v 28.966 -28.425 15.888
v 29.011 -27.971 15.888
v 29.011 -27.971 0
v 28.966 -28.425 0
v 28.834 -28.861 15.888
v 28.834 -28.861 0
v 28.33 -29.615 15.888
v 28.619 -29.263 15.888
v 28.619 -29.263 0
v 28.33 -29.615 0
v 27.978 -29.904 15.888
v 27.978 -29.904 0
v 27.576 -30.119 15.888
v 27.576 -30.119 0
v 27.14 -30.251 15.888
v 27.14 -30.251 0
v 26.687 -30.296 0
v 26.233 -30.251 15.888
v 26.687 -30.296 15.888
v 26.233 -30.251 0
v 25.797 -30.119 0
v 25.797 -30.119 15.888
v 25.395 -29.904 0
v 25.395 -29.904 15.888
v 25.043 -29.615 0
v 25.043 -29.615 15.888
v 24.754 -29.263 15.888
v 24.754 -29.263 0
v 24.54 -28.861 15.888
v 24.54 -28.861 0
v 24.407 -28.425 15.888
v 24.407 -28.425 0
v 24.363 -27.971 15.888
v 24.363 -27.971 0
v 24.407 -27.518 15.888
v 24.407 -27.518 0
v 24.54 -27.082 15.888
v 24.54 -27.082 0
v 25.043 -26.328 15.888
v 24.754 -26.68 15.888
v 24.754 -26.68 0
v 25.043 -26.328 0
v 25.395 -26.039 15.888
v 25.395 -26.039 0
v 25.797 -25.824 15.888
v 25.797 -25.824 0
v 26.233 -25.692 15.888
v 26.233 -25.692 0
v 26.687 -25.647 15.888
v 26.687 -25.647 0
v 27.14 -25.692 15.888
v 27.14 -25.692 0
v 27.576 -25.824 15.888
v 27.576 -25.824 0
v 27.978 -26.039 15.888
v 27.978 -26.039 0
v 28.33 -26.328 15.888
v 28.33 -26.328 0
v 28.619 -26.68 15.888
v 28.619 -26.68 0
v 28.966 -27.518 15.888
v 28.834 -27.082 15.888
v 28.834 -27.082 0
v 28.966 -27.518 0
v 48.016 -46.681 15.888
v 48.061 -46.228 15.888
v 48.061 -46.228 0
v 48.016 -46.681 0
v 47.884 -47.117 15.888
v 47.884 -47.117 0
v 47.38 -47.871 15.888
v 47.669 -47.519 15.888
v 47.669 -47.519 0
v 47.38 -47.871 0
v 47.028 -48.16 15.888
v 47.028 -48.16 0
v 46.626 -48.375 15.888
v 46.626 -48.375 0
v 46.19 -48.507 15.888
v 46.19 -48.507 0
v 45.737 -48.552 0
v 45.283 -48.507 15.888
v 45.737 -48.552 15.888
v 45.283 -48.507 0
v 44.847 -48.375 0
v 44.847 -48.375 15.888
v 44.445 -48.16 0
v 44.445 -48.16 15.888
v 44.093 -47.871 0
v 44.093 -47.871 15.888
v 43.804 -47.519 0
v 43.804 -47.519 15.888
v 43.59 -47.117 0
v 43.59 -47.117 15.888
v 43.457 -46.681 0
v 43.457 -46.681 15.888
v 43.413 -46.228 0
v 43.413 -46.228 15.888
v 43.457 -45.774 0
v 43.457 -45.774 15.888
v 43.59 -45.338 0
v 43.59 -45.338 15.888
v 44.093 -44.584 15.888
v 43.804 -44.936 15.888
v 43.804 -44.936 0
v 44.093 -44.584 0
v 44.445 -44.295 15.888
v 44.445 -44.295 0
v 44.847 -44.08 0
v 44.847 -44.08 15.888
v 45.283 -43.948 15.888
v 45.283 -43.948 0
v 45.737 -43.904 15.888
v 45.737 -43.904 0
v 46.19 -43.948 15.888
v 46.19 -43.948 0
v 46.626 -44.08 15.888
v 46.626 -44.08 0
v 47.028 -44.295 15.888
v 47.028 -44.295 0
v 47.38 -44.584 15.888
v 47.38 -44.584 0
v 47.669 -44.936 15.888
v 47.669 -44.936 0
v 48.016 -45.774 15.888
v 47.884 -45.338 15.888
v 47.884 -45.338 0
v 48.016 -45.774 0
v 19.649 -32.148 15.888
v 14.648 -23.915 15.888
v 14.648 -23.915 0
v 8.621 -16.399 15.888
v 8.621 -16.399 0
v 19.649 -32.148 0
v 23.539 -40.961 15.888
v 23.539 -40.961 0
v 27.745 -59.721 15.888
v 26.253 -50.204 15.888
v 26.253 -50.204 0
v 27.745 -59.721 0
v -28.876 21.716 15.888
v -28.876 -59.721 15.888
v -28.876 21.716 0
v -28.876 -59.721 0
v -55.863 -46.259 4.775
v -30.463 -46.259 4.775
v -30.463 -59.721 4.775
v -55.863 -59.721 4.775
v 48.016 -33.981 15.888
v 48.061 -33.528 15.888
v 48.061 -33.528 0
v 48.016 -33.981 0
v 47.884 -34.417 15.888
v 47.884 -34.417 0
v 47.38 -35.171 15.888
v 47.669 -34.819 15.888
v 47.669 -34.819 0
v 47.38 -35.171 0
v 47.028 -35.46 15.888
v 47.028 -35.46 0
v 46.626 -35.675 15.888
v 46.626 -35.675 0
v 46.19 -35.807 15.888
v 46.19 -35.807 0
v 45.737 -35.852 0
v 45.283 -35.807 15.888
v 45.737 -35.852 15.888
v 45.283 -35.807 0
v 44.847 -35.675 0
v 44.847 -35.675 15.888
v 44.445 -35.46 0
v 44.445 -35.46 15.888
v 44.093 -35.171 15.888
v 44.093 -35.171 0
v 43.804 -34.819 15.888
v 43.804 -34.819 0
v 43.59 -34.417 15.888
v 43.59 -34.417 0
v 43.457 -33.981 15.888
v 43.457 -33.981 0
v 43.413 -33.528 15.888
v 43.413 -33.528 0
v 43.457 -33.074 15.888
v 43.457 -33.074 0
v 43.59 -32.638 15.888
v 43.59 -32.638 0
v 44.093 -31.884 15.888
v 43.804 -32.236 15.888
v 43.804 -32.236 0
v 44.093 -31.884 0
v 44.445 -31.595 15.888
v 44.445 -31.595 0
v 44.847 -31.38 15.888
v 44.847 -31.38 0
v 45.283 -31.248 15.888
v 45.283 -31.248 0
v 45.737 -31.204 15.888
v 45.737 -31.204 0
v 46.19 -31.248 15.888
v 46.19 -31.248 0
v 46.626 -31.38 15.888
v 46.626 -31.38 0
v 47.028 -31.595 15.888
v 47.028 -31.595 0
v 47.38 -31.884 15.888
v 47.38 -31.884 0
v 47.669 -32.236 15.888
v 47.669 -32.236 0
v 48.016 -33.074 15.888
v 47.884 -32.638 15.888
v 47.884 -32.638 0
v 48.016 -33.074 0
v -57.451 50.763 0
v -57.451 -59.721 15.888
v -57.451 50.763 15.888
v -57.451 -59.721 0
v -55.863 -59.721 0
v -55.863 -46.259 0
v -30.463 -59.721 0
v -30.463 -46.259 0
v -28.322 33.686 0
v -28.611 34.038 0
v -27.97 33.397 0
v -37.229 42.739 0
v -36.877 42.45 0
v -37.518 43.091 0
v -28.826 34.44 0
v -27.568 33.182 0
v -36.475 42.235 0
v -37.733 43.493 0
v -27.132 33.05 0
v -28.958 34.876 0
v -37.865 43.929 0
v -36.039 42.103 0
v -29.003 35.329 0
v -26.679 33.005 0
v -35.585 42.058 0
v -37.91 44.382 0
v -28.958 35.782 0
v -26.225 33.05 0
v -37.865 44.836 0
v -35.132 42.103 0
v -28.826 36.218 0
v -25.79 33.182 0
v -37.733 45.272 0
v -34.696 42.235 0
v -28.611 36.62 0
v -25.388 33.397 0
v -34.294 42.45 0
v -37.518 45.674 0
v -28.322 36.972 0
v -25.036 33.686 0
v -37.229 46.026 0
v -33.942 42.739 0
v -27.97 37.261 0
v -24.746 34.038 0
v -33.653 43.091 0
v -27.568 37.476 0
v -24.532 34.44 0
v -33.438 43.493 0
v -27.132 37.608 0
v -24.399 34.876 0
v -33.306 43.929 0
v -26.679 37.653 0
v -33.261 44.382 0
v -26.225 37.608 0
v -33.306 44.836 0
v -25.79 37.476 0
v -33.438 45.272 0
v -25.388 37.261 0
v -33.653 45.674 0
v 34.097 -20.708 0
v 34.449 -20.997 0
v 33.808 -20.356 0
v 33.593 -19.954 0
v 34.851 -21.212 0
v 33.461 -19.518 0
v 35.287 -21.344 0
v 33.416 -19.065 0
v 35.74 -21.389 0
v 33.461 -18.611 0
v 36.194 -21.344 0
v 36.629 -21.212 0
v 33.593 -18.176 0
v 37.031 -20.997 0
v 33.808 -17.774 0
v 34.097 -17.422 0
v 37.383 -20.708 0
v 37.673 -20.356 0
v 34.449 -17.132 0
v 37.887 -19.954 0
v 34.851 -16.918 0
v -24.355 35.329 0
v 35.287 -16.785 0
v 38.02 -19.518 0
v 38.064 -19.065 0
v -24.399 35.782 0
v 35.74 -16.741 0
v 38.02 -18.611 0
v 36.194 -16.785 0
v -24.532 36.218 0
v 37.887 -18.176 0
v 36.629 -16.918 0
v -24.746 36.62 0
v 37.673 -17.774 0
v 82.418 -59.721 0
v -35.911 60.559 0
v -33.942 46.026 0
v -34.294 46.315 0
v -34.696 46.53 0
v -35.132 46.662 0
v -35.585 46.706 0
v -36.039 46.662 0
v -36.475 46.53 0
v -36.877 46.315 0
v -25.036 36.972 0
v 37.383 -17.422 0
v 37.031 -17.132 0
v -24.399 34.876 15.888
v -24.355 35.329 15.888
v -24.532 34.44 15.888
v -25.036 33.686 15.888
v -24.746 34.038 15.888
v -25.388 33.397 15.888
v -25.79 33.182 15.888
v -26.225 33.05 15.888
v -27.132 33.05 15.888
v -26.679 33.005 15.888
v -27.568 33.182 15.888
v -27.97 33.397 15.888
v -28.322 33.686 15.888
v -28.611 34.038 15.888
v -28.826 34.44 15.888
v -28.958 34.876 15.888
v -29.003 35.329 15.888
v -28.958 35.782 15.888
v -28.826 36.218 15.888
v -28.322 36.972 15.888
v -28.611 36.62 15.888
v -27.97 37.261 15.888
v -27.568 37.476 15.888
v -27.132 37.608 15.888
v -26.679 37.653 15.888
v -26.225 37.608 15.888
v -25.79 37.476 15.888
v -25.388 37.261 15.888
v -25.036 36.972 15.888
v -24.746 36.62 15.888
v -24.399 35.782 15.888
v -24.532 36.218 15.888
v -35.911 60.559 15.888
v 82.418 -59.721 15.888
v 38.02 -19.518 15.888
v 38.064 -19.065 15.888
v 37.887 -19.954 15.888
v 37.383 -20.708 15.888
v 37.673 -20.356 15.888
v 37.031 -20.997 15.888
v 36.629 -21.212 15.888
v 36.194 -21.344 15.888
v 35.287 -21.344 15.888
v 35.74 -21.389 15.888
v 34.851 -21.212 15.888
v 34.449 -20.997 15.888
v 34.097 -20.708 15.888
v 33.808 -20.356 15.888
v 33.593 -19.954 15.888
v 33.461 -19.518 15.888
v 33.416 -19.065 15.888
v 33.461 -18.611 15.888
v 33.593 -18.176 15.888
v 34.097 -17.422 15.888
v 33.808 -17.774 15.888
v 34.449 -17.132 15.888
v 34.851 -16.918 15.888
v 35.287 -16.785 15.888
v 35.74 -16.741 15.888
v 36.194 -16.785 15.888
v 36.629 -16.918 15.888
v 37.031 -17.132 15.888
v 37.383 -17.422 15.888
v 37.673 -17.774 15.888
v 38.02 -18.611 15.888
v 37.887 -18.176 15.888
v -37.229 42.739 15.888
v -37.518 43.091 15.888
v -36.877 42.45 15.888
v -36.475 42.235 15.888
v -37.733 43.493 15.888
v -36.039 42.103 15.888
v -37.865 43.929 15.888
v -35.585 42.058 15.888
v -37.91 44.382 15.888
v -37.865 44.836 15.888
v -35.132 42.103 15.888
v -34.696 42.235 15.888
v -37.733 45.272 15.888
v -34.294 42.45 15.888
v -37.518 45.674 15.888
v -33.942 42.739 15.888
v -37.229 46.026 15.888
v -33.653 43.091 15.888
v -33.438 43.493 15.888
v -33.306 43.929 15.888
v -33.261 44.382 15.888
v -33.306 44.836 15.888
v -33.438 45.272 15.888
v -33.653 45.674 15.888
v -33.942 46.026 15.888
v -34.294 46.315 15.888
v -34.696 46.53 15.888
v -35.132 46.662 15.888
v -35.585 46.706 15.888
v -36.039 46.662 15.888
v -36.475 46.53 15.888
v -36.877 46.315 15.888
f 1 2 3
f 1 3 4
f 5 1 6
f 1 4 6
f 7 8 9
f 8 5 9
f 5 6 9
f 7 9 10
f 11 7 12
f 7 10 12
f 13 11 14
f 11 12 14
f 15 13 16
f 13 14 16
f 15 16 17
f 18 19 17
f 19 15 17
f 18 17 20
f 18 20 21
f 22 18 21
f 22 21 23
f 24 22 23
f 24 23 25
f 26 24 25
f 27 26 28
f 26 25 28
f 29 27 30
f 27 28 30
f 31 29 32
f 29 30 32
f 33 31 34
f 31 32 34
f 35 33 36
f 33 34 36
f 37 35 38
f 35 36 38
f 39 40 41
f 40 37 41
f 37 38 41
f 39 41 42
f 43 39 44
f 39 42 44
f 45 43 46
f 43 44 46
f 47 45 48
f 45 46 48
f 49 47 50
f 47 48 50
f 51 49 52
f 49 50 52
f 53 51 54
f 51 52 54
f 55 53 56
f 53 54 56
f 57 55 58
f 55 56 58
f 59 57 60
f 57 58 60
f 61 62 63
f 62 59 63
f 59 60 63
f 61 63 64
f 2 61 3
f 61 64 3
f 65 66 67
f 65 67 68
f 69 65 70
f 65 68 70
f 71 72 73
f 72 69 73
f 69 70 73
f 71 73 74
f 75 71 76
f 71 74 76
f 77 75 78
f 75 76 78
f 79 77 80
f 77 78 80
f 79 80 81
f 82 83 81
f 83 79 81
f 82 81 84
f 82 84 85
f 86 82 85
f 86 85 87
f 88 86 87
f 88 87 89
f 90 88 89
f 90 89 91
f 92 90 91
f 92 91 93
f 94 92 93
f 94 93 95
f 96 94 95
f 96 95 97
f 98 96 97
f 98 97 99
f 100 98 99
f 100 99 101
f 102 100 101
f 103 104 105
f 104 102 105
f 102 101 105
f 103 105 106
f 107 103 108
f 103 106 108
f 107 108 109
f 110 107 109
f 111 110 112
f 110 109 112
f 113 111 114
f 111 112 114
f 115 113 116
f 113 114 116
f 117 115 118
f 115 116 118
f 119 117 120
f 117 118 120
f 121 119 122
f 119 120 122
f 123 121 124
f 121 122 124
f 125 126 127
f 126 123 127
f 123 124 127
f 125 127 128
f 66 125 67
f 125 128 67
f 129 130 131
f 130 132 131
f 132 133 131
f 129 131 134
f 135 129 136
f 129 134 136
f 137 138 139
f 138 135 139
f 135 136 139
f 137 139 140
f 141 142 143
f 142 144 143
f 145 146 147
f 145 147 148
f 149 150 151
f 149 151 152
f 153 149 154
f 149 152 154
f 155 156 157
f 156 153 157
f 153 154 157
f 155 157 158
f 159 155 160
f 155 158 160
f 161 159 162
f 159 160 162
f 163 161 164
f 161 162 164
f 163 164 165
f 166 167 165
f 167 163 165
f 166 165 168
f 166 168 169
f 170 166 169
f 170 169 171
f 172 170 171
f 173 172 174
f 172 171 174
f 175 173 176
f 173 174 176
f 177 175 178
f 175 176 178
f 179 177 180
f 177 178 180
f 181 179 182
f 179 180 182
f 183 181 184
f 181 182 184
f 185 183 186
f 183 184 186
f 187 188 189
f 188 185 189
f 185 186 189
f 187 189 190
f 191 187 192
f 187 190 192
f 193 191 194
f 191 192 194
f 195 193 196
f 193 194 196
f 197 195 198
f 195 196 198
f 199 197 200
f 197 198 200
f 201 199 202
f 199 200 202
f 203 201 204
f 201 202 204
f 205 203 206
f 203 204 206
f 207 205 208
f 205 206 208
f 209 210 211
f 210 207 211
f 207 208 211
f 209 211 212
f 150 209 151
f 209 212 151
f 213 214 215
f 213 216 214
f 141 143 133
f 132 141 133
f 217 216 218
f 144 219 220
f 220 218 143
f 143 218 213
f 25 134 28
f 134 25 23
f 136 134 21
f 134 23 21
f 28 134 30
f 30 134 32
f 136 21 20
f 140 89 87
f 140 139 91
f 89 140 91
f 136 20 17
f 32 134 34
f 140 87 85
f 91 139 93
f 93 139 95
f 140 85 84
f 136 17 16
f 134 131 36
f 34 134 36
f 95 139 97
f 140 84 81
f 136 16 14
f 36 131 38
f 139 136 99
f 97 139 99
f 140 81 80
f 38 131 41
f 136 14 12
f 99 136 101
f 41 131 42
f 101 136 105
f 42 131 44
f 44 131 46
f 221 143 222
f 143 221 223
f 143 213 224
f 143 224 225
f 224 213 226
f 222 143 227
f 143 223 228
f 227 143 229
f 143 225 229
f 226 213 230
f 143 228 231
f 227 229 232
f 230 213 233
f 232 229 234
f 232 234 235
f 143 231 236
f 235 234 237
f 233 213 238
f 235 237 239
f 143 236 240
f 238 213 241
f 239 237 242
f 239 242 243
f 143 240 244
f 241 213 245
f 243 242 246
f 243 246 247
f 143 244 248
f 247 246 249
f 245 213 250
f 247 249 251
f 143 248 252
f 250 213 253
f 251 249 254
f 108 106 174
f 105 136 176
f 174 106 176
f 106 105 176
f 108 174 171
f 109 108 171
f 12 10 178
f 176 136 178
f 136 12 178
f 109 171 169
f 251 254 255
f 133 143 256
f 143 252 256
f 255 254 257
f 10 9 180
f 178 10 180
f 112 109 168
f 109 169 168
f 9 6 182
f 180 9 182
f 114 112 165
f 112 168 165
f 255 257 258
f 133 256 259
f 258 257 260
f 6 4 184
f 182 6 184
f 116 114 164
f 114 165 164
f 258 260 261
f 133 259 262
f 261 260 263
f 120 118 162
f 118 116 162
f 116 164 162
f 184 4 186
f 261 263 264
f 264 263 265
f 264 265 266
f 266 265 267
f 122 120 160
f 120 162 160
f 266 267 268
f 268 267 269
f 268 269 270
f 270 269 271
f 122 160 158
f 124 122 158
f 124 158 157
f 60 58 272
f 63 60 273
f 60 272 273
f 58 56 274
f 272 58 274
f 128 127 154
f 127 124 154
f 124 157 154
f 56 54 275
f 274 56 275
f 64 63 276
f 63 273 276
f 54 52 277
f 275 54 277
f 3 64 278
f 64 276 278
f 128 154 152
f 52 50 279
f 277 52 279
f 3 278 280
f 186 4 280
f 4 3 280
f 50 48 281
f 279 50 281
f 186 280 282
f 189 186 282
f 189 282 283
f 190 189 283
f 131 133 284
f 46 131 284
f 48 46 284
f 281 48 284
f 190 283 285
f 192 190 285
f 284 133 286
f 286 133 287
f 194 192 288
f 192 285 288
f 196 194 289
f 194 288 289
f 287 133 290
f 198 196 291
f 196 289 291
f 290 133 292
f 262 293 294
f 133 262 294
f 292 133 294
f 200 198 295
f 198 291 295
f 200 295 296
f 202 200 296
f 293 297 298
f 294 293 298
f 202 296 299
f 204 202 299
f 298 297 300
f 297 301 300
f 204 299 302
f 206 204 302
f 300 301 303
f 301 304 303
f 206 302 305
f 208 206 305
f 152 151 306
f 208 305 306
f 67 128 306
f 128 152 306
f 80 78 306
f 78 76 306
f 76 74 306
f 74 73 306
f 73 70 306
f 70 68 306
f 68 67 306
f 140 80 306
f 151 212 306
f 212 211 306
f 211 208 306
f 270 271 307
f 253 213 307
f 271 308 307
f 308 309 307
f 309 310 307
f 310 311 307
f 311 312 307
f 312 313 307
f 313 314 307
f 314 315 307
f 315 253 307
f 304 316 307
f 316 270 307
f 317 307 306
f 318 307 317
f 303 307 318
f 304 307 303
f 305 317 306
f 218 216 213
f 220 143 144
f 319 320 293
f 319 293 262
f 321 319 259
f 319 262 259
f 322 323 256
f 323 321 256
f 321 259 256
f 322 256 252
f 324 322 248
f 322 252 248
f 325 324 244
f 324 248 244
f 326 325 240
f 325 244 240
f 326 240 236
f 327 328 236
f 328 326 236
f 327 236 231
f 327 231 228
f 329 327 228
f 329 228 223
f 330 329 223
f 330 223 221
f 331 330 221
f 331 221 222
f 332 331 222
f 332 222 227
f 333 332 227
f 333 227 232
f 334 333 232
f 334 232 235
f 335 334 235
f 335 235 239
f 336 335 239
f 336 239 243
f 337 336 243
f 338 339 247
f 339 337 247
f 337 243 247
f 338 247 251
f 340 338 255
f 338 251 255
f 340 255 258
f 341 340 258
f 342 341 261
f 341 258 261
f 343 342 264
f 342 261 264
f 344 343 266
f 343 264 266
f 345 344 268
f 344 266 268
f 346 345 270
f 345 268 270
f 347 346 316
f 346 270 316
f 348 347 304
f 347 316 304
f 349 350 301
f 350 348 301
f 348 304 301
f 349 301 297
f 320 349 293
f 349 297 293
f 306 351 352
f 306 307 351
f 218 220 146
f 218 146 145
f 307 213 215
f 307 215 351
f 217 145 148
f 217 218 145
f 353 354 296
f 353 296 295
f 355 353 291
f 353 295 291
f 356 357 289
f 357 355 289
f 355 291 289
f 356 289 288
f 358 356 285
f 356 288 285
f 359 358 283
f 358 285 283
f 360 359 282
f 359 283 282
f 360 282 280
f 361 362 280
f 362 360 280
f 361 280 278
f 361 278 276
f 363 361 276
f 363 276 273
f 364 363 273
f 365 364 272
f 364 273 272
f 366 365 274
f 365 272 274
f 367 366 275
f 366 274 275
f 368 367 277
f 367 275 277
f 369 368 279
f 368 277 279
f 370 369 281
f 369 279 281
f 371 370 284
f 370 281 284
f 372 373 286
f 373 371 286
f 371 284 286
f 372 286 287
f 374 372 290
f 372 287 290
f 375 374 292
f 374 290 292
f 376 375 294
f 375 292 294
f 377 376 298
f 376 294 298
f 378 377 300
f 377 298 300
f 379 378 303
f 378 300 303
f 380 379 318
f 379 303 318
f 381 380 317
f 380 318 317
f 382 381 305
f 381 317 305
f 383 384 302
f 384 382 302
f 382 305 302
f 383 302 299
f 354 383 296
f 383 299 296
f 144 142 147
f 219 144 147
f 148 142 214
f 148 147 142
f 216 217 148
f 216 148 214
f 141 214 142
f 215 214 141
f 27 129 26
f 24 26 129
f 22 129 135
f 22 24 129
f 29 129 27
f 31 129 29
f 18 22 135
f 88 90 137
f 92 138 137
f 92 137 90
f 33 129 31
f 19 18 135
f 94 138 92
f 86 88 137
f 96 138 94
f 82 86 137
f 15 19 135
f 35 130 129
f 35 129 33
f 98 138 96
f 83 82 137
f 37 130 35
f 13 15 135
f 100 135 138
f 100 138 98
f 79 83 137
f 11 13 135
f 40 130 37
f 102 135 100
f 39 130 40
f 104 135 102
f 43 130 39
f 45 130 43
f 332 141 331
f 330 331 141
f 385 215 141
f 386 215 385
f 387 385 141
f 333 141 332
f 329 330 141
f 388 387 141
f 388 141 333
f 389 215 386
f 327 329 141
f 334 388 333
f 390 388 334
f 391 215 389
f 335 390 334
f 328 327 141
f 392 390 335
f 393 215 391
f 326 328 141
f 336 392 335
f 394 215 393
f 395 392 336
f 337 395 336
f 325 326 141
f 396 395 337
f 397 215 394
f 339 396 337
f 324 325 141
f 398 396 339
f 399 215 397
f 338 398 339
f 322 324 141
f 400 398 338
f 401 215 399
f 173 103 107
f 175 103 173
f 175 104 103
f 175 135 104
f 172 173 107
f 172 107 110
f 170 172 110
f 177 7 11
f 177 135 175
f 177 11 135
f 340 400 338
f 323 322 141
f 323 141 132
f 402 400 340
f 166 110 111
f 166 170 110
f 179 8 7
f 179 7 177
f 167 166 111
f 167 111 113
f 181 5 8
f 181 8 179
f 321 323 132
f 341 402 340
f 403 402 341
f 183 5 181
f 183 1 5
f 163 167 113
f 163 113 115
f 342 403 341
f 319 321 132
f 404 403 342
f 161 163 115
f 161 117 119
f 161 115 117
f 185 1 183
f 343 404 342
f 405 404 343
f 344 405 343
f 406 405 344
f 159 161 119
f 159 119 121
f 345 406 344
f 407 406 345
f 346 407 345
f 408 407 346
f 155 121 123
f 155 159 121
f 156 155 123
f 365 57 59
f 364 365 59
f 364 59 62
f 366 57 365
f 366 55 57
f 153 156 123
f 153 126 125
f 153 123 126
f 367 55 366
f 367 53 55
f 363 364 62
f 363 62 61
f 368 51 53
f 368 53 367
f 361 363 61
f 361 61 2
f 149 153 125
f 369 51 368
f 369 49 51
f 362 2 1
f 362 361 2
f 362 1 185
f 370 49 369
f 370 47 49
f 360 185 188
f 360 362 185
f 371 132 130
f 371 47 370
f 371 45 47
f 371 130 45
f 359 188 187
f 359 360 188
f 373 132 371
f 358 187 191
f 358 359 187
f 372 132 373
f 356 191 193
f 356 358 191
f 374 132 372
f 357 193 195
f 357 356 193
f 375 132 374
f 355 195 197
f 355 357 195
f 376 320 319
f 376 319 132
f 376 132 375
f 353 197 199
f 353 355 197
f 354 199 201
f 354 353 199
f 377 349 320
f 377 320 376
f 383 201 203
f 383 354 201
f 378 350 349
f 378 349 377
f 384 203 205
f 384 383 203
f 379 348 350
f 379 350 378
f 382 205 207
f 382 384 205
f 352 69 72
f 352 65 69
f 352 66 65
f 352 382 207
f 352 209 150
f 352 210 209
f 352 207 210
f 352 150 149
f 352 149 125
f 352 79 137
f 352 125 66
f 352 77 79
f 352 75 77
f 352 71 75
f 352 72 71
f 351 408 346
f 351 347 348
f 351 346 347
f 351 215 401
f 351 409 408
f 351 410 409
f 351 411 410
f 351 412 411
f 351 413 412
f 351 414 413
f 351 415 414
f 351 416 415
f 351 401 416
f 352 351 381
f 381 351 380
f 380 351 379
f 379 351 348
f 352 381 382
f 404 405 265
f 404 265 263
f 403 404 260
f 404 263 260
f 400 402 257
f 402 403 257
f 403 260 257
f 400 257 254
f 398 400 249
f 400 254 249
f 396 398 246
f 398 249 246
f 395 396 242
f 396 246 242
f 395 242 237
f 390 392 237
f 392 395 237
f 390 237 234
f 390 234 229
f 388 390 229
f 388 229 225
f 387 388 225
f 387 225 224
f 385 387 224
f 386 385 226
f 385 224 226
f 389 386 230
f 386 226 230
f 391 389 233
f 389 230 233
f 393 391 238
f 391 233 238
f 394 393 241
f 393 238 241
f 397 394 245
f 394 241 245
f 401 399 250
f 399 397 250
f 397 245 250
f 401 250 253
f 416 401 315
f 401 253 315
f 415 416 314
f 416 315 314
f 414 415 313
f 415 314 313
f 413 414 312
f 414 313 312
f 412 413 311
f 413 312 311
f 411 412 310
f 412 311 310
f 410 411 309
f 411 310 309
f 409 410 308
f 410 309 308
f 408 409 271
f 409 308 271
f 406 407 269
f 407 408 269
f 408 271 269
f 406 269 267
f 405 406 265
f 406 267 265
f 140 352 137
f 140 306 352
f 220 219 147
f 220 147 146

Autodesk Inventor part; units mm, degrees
ref_plane "YZ Plane" through (0, 0, 0) normal (1, 0, 0) x (0, 1, 0)
ref_plane "XZ Plane" through (0, 0, 0) normal (0, 1, 0) x (-1, 0, 0)
ref_plane "XY Plane" through (0, 0, 0) normal (0, 0, 1) x (1, 0, 0)
sketch "Sketch1" plane through (0, 0, 0) normal (0, 0, 1) x (1, 0, 0)
  line L0 (-28.8758, -59.7214) -> (-28.8758, 21.7165)
  line L1 (-18.8555, -59.7214) -> (-80.3235, -59.7214)
  line L2 (-57.4508, -59.7214) -> (-57.4508, 50.7628)
  line L3 (-28.8758, 21.7165) -> (27.7449, -35.838)
  line L4 (27.7449, -35.838) -> (27.7449, -59.7214)
  line L5 (-57.4508, 50.7628) -> (-35.9111, 60.559)
  line L6 (-35.9111, 60.559) -> (82.4177, -59.7214)
  line L7 (82.4177, -59.7214) -> (27.7449, -59.7214)
  arc A0 (27.7449, -59.7214) -> (8.6214, -16.3991) centre (-46.0524, -66.4154) ccw
  circle A1 centre (45.7367, -33.5276) radius 2.3241
  circle A2 centre (45.7367, -46.2276) radius 2.3241
  circle A3 centre (26.6867, -27.9714) radius 2.3241
  circle A4 centre (35.7401, -19.0649) radius 2.3241
  circle A5 centre (-35.5854, 44.3824) radius 2.3241
  circle A6 centre (-26.6789, 35.329) radius 2.3241
  point P0 (0, 0)
  dimension "d0" = 90
  dimension "d1" = 90
  dimension "d2" = 4.6482
  dimension "d3" = 4.6482
  dimension "d4" = 4.6482
  dimension "d5" = 4.6482
  dimension "d6" = 4.6482
  dimension "d7" = 4.6482
extrude "Extrusion1" add sketch "Sketch1" along normal blind 15.8877
sketch "Sketch2" plane through (0, 0, 0) normal (0, 0, -1) x (-1, 0, 0)
  line L0 (28.8758, -59.7214) -> (28.8758, 21.7165) projected
  line L1 (57.4508, -59.7214) -> (28.8758, -59.7214) projected
  line L2 (57.4508, 50.7628) -> (57.4508, -59.7214) projected
  line L3 (28.8758, -59.7214) -> (30.4633, -59.7214)
  line L4 (57.4508, -59.7214) -> (55.8633, -59.7214)
  line L5 (30.4633, -59.7214) -> (30.4633, -46.2594)
  line L6 (30.4633, -46.2594) -> (55.8633, -46.2594)
  line L7 (55.8633, -46.2594) -> (55.8633, -59.7214)
  line L8 (28.8758, -59.7214) -> (28.8758, -46.2594)
  line L9 (30.4633, -46.2594) -> (28.8758, -46.2594)
  line L10 (55.8633, -46.2594) -> (57.4508, -46.2594)
  line L11 (57.4508, -59.7214) -> (57.4508, -46.2594)
  point P0 (0, 0)
  dimension "d10" = 1.5875
  dimension "d11" = 1.5875
  dimension "d12" = 13.462
extrude "Extrusion2" cut sketch "Sketch2" against normal blind 4.7752 contours L5 L6 L7 L1
properties part number "Lady Brown Brace"
